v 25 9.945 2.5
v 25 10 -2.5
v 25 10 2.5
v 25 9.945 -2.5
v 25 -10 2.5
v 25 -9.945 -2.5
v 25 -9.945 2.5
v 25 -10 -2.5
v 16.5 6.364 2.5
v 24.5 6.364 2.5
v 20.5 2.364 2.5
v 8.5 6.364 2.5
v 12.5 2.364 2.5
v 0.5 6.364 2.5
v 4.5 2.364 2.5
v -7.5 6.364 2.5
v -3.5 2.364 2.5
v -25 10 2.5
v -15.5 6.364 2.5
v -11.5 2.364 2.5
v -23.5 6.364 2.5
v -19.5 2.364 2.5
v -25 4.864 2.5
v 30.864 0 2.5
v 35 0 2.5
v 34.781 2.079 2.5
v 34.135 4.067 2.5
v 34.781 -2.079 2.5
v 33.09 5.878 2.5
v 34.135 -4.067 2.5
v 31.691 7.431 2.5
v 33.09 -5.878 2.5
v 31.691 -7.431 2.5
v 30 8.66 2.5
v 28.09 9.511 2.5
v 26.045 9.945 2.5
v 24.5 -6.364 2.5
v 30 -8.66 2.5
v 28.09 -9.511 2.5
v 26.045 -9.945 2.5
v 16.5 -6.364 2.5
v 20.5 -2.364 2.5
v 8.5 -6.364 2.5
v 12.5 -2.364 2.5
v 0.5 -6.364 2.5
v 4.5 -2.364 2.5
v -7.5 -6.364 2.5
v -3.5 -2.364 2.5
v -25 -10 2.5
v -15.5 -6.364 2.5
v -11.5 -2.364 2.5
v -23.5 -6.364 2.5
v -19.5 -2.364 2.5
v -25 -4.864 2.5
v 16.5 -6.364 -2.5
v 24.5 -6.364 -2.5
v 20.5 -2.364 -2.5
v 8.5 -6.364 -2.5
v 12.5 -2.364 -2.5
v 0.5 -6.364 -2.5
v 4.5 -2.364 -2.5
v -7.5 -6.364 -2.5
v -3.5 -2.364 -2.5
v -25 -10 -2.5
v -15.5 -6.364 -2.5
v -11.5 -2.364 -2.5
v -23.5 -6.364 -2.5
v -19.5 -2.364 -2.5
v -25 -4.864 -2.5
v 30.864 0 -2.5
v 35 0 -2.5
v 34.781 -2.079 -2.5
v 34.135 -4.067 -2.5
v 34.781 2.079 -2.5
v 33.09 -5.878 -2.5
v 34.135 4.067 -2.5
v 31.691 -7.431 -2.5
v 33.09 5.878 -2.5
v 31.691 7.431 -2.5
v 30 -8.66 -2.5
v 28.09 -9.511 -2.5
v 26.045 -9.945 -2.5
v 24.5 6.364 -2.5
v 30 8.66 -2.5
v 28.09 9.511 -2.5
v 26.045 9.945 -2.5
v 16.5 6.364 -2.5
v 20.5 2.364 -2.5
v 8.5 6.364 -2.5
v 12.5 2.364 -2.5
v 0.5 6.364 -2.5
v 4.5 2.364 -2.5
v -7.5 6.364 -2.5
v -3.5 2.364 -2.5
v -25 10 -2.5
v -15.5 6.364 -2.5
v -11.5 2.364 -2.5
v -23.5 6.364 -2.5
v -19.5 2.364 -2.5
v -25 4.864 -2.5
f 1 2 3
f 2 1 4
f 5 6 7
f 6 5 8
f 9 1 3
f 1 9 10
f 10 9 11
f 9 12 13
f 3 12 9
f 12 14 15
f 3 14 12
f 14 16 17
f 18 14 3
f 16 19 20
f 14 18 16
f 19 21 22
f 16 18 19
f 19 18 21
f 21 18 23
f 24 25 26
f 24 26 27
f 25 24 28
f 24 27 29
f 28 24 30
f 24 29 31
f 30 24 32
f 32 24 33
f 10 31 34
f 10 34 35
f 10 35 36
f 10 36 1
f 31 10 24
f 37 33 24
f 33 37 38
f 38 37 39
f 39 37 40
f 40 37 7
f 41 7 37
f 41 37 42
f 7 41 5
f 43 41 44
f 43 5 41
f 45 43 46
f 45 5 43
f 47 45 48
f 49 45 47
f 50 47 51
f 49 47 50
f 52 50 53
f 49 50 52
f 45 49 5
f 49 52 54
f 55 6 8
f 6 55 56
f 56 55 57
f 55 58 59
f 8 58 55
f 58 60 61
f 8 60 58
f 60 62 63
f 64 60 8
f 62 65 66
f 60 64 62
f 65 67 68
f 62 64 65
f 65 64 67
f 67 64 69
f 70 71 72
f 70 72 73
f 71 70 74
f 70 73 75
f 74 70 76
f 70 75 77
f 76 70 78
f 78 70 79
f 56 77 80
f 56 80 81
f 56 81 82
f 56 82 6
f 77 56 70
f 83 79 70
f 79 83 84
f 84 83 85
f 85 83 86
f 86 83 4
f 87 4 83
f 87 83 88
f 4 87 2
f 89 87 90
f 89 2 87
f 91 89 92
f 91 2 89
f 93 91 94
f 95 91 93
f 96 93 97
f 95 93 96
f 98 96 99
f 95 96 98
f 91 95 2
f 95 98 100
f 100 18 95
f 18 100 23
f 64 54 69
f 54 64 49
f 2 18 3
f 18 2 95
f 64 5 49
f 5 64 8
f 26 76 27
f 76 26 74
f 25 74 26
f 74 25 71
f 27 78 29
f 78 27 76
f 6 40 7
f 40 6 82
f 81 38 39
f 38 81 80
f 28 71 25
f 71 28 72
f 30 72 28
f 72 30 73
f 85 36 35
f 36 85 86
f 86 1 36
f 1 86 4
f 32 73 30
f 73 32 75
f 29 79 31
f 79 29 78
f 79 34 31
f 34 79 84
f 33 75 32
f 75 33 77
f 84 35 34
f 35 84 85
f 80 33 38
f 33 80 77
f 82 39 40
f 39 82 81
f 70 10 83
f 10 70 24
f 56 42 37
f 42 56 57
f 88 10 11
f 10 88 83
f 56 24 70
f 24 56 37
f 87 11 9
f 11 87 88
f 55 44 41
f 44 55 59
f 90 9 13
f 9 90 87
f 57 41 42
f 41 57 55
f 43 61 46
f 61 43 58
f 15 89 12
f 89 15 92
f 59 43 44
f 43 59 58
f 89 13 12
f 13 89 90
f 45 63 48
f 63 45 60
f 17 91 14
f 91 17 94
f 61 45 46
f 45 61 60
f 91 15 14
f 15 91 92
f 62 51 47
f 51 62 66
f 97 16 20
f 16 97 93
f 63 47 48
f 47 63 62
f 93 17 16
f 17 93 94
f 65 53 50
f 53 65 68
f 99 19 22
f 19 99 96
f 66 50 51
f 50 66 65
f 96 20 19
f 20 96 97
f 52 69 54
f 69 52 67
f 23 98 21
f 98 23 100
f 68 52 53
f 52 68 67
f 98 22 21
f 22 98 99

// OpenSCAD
/**
 * Clip
 * cvocek na otevreny pytlicek
 * @param x celkova delka objektu
 * @param y celkova sirka objektu
 * @param z celkova vyska objektu
 * @param tooth strana jednoho zubu
 * @param off offset zprava kde je cylinder
 * @param distance vzdalenost mezi zuby
 * @author Jakub Průša
 */

module clip (x=60,y=20,z=5,tooth=9,off=6,distance=8) {
  
    
  translate([(x*0.5+y*0.5*0.5),0,0]) difference(){
    translate([-(x*0.5+y*0.5*0.5),0,0]) union(){
           cube([x-y*0.5,y,z],center=true);
        translate([0.5*(x-y*0.5),0,0]) cylinder(d=y,h=z,center=true);
      } 
      pocet = (x - off)/distance;
      for(x=[0:floor(pocet)]){
          translate([-(tooth*0.5+off+x*distance),0,0]) rotate([0,0,45]) cube([tooth,tooth,z],center=true);
          
      }
      
  }
}


clip();
